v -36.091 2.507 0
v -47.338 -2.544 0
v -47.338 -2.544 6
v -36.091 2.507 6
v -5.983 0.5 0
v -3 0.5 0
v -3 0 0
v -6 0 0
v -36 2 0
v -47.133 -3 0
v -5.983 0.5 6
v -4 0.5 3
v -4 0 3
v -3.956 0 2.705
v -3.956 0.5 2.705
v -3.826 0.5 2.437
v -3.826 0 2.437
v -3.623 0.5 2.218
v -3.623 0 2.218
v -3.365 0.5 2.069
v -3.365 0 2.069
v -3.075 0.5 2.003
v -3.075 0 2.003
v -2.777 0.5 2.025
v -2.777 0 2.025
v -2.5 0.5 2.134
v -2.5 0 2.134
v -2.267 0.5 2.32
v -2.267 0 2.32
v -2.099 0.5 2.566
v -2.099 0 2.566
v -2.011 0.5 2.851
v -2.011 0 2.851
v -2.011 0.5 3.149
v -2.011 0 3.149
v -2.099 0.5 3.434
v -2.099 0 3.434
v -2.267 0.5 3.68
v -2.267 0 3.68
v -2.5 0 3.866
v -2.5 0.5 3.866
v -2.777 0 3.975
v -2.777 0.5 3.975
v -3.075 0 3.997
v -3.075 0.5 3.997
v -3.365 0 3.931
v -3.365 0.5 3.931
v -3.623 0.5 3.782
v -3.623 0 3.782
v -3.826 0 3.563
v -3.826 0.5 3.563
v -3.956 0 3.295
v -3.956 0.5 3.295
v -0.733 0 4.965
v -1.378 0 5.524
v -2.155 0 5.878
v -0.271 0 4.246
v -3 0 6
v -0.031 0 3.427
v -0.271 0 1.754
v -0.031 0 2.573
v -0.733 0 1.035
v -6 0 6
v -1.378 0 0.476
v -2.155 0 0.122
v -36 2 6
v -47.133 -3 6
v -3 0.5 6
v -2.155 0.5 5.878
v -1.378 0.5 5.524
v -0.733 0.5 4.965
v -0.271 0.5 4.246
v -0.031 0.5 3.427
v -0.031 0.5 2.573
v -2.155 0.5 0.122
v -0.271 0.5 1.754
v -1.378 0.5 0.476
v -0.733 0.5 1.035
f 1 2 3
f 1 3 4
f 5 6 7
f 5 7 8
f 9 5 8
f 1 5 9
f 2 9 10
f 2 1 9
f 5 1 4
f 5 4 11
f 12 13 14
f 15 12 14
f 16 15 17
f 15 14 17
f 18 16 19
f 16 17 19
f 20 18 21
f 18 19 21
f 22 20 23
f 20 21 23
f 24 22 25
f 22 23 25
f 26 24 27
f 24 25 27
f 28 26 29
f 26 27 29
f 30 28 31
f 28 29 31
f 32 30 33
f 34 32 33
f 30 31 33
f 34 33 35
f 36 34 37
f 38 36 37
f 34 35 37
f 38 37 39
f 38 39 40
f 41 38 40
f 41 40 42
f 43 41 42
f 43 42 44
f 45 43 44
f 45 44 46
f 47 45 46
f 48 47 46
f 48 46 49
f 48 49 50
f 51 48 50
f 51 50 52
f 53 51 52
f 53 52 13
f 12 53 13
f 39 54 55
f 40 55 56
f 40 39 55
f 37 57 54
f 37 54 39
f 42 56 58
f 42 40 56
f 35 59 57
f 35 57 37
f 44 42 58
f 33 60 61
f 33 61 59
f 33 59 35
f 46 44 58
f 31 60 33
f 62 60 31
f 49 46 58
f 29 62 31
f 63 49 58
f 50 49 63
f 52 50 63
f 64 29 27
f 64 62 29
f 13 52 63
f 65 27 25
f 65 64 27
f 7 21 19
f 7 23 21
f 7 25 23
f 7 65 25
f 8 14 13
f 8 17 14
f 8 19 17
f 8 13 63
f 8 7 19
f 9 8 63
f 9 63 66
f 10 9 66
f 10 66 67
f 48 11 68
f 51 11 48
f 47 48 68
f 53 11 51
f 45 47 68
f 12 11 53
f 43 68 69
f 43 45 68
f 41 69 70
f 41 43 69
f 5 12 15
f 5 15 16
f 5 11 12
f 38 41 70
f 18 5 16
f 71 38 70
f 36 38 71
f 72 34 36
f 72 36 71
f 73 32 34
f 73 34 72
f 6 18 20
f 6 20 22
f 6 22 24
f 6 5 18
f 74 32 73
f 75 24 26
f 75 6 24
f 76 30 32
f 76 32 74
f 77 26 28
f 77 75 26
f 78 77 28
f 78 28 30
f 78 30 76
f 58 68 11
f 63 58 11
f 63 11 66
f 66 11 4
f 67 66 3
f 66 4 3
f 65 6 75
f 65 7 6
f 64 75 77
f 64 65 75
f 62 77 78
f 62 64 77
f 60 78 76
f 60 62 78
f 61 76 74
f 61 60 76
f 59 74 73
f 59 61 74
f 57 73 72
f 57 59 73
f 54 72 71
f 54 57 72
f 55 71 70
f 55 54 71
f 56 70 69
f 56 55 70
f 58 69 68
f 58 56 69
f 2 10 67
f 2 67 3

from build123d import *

# Parameters (mm, degrees)
EXTRUDE_THIN1_DEPTH   = 6
FILLET1_RADIUS        = 3
FILLET1_LENGTH        = 0.5
F_2_0MM_DOWEL_HOLE1_D = 2


with BuildPart() as part:
    # Sketch1 → Extrude-Thin1 (new body)
    with BuildSketch(Plane.XY):
        Polygon((0, 0), (-6, 0), (-36, 2), (-47.132818026, -3), (-47.337667505, -2.543889606), (-36.091128385, 2.507185105), (-5.983351811, 0.5), (0, 0.5), align=None)
    extrude(amount=EXTRUDE_THIN1_DEPTH)

    # Fillet1: full round fillet: the end face becomes a half cylinder, R = half its width
    fillet1_face = Plane((0, 0.25, 3), x_dir=(0, -1, 0), z_dir=(1, 0, 0))  # on the end face: x along it, z out of the body
    fillet1_slab = fillet1_face.offset(-FILLET1_RADIUS / 2) * Box(FILLET1_LENGTH, 2 * FILLET1_RADIUS, FILLET1_RADIUS, mode=Mode.PRIVATE)  # the body's end, R deep
    fillet1_round = Plane((-3, 0.25, 3), x_dir=(1, 0, 0), z_dir=(0, -1, 0)) * Cylinder(FILLET1_RADIUS, FILLET1_LENGTH, mode=Mode.PRIVATE)  # its axis R under the face
    add(fillet1_slab - fillet1_round, mode=Mode.SUBTRACT)

    # Ø2.0mm Dowel Hole1 (through all)
    with Locations(Plane(origin=(0, 0.5, 0), x_dir=(1, 0, 0), z_dir=(0, 1, 0))):
        with Locations((-3, -3)):
            Hole(F_2_0MM_DOWEL_HOLE1_D / 2)


solid = part.part
